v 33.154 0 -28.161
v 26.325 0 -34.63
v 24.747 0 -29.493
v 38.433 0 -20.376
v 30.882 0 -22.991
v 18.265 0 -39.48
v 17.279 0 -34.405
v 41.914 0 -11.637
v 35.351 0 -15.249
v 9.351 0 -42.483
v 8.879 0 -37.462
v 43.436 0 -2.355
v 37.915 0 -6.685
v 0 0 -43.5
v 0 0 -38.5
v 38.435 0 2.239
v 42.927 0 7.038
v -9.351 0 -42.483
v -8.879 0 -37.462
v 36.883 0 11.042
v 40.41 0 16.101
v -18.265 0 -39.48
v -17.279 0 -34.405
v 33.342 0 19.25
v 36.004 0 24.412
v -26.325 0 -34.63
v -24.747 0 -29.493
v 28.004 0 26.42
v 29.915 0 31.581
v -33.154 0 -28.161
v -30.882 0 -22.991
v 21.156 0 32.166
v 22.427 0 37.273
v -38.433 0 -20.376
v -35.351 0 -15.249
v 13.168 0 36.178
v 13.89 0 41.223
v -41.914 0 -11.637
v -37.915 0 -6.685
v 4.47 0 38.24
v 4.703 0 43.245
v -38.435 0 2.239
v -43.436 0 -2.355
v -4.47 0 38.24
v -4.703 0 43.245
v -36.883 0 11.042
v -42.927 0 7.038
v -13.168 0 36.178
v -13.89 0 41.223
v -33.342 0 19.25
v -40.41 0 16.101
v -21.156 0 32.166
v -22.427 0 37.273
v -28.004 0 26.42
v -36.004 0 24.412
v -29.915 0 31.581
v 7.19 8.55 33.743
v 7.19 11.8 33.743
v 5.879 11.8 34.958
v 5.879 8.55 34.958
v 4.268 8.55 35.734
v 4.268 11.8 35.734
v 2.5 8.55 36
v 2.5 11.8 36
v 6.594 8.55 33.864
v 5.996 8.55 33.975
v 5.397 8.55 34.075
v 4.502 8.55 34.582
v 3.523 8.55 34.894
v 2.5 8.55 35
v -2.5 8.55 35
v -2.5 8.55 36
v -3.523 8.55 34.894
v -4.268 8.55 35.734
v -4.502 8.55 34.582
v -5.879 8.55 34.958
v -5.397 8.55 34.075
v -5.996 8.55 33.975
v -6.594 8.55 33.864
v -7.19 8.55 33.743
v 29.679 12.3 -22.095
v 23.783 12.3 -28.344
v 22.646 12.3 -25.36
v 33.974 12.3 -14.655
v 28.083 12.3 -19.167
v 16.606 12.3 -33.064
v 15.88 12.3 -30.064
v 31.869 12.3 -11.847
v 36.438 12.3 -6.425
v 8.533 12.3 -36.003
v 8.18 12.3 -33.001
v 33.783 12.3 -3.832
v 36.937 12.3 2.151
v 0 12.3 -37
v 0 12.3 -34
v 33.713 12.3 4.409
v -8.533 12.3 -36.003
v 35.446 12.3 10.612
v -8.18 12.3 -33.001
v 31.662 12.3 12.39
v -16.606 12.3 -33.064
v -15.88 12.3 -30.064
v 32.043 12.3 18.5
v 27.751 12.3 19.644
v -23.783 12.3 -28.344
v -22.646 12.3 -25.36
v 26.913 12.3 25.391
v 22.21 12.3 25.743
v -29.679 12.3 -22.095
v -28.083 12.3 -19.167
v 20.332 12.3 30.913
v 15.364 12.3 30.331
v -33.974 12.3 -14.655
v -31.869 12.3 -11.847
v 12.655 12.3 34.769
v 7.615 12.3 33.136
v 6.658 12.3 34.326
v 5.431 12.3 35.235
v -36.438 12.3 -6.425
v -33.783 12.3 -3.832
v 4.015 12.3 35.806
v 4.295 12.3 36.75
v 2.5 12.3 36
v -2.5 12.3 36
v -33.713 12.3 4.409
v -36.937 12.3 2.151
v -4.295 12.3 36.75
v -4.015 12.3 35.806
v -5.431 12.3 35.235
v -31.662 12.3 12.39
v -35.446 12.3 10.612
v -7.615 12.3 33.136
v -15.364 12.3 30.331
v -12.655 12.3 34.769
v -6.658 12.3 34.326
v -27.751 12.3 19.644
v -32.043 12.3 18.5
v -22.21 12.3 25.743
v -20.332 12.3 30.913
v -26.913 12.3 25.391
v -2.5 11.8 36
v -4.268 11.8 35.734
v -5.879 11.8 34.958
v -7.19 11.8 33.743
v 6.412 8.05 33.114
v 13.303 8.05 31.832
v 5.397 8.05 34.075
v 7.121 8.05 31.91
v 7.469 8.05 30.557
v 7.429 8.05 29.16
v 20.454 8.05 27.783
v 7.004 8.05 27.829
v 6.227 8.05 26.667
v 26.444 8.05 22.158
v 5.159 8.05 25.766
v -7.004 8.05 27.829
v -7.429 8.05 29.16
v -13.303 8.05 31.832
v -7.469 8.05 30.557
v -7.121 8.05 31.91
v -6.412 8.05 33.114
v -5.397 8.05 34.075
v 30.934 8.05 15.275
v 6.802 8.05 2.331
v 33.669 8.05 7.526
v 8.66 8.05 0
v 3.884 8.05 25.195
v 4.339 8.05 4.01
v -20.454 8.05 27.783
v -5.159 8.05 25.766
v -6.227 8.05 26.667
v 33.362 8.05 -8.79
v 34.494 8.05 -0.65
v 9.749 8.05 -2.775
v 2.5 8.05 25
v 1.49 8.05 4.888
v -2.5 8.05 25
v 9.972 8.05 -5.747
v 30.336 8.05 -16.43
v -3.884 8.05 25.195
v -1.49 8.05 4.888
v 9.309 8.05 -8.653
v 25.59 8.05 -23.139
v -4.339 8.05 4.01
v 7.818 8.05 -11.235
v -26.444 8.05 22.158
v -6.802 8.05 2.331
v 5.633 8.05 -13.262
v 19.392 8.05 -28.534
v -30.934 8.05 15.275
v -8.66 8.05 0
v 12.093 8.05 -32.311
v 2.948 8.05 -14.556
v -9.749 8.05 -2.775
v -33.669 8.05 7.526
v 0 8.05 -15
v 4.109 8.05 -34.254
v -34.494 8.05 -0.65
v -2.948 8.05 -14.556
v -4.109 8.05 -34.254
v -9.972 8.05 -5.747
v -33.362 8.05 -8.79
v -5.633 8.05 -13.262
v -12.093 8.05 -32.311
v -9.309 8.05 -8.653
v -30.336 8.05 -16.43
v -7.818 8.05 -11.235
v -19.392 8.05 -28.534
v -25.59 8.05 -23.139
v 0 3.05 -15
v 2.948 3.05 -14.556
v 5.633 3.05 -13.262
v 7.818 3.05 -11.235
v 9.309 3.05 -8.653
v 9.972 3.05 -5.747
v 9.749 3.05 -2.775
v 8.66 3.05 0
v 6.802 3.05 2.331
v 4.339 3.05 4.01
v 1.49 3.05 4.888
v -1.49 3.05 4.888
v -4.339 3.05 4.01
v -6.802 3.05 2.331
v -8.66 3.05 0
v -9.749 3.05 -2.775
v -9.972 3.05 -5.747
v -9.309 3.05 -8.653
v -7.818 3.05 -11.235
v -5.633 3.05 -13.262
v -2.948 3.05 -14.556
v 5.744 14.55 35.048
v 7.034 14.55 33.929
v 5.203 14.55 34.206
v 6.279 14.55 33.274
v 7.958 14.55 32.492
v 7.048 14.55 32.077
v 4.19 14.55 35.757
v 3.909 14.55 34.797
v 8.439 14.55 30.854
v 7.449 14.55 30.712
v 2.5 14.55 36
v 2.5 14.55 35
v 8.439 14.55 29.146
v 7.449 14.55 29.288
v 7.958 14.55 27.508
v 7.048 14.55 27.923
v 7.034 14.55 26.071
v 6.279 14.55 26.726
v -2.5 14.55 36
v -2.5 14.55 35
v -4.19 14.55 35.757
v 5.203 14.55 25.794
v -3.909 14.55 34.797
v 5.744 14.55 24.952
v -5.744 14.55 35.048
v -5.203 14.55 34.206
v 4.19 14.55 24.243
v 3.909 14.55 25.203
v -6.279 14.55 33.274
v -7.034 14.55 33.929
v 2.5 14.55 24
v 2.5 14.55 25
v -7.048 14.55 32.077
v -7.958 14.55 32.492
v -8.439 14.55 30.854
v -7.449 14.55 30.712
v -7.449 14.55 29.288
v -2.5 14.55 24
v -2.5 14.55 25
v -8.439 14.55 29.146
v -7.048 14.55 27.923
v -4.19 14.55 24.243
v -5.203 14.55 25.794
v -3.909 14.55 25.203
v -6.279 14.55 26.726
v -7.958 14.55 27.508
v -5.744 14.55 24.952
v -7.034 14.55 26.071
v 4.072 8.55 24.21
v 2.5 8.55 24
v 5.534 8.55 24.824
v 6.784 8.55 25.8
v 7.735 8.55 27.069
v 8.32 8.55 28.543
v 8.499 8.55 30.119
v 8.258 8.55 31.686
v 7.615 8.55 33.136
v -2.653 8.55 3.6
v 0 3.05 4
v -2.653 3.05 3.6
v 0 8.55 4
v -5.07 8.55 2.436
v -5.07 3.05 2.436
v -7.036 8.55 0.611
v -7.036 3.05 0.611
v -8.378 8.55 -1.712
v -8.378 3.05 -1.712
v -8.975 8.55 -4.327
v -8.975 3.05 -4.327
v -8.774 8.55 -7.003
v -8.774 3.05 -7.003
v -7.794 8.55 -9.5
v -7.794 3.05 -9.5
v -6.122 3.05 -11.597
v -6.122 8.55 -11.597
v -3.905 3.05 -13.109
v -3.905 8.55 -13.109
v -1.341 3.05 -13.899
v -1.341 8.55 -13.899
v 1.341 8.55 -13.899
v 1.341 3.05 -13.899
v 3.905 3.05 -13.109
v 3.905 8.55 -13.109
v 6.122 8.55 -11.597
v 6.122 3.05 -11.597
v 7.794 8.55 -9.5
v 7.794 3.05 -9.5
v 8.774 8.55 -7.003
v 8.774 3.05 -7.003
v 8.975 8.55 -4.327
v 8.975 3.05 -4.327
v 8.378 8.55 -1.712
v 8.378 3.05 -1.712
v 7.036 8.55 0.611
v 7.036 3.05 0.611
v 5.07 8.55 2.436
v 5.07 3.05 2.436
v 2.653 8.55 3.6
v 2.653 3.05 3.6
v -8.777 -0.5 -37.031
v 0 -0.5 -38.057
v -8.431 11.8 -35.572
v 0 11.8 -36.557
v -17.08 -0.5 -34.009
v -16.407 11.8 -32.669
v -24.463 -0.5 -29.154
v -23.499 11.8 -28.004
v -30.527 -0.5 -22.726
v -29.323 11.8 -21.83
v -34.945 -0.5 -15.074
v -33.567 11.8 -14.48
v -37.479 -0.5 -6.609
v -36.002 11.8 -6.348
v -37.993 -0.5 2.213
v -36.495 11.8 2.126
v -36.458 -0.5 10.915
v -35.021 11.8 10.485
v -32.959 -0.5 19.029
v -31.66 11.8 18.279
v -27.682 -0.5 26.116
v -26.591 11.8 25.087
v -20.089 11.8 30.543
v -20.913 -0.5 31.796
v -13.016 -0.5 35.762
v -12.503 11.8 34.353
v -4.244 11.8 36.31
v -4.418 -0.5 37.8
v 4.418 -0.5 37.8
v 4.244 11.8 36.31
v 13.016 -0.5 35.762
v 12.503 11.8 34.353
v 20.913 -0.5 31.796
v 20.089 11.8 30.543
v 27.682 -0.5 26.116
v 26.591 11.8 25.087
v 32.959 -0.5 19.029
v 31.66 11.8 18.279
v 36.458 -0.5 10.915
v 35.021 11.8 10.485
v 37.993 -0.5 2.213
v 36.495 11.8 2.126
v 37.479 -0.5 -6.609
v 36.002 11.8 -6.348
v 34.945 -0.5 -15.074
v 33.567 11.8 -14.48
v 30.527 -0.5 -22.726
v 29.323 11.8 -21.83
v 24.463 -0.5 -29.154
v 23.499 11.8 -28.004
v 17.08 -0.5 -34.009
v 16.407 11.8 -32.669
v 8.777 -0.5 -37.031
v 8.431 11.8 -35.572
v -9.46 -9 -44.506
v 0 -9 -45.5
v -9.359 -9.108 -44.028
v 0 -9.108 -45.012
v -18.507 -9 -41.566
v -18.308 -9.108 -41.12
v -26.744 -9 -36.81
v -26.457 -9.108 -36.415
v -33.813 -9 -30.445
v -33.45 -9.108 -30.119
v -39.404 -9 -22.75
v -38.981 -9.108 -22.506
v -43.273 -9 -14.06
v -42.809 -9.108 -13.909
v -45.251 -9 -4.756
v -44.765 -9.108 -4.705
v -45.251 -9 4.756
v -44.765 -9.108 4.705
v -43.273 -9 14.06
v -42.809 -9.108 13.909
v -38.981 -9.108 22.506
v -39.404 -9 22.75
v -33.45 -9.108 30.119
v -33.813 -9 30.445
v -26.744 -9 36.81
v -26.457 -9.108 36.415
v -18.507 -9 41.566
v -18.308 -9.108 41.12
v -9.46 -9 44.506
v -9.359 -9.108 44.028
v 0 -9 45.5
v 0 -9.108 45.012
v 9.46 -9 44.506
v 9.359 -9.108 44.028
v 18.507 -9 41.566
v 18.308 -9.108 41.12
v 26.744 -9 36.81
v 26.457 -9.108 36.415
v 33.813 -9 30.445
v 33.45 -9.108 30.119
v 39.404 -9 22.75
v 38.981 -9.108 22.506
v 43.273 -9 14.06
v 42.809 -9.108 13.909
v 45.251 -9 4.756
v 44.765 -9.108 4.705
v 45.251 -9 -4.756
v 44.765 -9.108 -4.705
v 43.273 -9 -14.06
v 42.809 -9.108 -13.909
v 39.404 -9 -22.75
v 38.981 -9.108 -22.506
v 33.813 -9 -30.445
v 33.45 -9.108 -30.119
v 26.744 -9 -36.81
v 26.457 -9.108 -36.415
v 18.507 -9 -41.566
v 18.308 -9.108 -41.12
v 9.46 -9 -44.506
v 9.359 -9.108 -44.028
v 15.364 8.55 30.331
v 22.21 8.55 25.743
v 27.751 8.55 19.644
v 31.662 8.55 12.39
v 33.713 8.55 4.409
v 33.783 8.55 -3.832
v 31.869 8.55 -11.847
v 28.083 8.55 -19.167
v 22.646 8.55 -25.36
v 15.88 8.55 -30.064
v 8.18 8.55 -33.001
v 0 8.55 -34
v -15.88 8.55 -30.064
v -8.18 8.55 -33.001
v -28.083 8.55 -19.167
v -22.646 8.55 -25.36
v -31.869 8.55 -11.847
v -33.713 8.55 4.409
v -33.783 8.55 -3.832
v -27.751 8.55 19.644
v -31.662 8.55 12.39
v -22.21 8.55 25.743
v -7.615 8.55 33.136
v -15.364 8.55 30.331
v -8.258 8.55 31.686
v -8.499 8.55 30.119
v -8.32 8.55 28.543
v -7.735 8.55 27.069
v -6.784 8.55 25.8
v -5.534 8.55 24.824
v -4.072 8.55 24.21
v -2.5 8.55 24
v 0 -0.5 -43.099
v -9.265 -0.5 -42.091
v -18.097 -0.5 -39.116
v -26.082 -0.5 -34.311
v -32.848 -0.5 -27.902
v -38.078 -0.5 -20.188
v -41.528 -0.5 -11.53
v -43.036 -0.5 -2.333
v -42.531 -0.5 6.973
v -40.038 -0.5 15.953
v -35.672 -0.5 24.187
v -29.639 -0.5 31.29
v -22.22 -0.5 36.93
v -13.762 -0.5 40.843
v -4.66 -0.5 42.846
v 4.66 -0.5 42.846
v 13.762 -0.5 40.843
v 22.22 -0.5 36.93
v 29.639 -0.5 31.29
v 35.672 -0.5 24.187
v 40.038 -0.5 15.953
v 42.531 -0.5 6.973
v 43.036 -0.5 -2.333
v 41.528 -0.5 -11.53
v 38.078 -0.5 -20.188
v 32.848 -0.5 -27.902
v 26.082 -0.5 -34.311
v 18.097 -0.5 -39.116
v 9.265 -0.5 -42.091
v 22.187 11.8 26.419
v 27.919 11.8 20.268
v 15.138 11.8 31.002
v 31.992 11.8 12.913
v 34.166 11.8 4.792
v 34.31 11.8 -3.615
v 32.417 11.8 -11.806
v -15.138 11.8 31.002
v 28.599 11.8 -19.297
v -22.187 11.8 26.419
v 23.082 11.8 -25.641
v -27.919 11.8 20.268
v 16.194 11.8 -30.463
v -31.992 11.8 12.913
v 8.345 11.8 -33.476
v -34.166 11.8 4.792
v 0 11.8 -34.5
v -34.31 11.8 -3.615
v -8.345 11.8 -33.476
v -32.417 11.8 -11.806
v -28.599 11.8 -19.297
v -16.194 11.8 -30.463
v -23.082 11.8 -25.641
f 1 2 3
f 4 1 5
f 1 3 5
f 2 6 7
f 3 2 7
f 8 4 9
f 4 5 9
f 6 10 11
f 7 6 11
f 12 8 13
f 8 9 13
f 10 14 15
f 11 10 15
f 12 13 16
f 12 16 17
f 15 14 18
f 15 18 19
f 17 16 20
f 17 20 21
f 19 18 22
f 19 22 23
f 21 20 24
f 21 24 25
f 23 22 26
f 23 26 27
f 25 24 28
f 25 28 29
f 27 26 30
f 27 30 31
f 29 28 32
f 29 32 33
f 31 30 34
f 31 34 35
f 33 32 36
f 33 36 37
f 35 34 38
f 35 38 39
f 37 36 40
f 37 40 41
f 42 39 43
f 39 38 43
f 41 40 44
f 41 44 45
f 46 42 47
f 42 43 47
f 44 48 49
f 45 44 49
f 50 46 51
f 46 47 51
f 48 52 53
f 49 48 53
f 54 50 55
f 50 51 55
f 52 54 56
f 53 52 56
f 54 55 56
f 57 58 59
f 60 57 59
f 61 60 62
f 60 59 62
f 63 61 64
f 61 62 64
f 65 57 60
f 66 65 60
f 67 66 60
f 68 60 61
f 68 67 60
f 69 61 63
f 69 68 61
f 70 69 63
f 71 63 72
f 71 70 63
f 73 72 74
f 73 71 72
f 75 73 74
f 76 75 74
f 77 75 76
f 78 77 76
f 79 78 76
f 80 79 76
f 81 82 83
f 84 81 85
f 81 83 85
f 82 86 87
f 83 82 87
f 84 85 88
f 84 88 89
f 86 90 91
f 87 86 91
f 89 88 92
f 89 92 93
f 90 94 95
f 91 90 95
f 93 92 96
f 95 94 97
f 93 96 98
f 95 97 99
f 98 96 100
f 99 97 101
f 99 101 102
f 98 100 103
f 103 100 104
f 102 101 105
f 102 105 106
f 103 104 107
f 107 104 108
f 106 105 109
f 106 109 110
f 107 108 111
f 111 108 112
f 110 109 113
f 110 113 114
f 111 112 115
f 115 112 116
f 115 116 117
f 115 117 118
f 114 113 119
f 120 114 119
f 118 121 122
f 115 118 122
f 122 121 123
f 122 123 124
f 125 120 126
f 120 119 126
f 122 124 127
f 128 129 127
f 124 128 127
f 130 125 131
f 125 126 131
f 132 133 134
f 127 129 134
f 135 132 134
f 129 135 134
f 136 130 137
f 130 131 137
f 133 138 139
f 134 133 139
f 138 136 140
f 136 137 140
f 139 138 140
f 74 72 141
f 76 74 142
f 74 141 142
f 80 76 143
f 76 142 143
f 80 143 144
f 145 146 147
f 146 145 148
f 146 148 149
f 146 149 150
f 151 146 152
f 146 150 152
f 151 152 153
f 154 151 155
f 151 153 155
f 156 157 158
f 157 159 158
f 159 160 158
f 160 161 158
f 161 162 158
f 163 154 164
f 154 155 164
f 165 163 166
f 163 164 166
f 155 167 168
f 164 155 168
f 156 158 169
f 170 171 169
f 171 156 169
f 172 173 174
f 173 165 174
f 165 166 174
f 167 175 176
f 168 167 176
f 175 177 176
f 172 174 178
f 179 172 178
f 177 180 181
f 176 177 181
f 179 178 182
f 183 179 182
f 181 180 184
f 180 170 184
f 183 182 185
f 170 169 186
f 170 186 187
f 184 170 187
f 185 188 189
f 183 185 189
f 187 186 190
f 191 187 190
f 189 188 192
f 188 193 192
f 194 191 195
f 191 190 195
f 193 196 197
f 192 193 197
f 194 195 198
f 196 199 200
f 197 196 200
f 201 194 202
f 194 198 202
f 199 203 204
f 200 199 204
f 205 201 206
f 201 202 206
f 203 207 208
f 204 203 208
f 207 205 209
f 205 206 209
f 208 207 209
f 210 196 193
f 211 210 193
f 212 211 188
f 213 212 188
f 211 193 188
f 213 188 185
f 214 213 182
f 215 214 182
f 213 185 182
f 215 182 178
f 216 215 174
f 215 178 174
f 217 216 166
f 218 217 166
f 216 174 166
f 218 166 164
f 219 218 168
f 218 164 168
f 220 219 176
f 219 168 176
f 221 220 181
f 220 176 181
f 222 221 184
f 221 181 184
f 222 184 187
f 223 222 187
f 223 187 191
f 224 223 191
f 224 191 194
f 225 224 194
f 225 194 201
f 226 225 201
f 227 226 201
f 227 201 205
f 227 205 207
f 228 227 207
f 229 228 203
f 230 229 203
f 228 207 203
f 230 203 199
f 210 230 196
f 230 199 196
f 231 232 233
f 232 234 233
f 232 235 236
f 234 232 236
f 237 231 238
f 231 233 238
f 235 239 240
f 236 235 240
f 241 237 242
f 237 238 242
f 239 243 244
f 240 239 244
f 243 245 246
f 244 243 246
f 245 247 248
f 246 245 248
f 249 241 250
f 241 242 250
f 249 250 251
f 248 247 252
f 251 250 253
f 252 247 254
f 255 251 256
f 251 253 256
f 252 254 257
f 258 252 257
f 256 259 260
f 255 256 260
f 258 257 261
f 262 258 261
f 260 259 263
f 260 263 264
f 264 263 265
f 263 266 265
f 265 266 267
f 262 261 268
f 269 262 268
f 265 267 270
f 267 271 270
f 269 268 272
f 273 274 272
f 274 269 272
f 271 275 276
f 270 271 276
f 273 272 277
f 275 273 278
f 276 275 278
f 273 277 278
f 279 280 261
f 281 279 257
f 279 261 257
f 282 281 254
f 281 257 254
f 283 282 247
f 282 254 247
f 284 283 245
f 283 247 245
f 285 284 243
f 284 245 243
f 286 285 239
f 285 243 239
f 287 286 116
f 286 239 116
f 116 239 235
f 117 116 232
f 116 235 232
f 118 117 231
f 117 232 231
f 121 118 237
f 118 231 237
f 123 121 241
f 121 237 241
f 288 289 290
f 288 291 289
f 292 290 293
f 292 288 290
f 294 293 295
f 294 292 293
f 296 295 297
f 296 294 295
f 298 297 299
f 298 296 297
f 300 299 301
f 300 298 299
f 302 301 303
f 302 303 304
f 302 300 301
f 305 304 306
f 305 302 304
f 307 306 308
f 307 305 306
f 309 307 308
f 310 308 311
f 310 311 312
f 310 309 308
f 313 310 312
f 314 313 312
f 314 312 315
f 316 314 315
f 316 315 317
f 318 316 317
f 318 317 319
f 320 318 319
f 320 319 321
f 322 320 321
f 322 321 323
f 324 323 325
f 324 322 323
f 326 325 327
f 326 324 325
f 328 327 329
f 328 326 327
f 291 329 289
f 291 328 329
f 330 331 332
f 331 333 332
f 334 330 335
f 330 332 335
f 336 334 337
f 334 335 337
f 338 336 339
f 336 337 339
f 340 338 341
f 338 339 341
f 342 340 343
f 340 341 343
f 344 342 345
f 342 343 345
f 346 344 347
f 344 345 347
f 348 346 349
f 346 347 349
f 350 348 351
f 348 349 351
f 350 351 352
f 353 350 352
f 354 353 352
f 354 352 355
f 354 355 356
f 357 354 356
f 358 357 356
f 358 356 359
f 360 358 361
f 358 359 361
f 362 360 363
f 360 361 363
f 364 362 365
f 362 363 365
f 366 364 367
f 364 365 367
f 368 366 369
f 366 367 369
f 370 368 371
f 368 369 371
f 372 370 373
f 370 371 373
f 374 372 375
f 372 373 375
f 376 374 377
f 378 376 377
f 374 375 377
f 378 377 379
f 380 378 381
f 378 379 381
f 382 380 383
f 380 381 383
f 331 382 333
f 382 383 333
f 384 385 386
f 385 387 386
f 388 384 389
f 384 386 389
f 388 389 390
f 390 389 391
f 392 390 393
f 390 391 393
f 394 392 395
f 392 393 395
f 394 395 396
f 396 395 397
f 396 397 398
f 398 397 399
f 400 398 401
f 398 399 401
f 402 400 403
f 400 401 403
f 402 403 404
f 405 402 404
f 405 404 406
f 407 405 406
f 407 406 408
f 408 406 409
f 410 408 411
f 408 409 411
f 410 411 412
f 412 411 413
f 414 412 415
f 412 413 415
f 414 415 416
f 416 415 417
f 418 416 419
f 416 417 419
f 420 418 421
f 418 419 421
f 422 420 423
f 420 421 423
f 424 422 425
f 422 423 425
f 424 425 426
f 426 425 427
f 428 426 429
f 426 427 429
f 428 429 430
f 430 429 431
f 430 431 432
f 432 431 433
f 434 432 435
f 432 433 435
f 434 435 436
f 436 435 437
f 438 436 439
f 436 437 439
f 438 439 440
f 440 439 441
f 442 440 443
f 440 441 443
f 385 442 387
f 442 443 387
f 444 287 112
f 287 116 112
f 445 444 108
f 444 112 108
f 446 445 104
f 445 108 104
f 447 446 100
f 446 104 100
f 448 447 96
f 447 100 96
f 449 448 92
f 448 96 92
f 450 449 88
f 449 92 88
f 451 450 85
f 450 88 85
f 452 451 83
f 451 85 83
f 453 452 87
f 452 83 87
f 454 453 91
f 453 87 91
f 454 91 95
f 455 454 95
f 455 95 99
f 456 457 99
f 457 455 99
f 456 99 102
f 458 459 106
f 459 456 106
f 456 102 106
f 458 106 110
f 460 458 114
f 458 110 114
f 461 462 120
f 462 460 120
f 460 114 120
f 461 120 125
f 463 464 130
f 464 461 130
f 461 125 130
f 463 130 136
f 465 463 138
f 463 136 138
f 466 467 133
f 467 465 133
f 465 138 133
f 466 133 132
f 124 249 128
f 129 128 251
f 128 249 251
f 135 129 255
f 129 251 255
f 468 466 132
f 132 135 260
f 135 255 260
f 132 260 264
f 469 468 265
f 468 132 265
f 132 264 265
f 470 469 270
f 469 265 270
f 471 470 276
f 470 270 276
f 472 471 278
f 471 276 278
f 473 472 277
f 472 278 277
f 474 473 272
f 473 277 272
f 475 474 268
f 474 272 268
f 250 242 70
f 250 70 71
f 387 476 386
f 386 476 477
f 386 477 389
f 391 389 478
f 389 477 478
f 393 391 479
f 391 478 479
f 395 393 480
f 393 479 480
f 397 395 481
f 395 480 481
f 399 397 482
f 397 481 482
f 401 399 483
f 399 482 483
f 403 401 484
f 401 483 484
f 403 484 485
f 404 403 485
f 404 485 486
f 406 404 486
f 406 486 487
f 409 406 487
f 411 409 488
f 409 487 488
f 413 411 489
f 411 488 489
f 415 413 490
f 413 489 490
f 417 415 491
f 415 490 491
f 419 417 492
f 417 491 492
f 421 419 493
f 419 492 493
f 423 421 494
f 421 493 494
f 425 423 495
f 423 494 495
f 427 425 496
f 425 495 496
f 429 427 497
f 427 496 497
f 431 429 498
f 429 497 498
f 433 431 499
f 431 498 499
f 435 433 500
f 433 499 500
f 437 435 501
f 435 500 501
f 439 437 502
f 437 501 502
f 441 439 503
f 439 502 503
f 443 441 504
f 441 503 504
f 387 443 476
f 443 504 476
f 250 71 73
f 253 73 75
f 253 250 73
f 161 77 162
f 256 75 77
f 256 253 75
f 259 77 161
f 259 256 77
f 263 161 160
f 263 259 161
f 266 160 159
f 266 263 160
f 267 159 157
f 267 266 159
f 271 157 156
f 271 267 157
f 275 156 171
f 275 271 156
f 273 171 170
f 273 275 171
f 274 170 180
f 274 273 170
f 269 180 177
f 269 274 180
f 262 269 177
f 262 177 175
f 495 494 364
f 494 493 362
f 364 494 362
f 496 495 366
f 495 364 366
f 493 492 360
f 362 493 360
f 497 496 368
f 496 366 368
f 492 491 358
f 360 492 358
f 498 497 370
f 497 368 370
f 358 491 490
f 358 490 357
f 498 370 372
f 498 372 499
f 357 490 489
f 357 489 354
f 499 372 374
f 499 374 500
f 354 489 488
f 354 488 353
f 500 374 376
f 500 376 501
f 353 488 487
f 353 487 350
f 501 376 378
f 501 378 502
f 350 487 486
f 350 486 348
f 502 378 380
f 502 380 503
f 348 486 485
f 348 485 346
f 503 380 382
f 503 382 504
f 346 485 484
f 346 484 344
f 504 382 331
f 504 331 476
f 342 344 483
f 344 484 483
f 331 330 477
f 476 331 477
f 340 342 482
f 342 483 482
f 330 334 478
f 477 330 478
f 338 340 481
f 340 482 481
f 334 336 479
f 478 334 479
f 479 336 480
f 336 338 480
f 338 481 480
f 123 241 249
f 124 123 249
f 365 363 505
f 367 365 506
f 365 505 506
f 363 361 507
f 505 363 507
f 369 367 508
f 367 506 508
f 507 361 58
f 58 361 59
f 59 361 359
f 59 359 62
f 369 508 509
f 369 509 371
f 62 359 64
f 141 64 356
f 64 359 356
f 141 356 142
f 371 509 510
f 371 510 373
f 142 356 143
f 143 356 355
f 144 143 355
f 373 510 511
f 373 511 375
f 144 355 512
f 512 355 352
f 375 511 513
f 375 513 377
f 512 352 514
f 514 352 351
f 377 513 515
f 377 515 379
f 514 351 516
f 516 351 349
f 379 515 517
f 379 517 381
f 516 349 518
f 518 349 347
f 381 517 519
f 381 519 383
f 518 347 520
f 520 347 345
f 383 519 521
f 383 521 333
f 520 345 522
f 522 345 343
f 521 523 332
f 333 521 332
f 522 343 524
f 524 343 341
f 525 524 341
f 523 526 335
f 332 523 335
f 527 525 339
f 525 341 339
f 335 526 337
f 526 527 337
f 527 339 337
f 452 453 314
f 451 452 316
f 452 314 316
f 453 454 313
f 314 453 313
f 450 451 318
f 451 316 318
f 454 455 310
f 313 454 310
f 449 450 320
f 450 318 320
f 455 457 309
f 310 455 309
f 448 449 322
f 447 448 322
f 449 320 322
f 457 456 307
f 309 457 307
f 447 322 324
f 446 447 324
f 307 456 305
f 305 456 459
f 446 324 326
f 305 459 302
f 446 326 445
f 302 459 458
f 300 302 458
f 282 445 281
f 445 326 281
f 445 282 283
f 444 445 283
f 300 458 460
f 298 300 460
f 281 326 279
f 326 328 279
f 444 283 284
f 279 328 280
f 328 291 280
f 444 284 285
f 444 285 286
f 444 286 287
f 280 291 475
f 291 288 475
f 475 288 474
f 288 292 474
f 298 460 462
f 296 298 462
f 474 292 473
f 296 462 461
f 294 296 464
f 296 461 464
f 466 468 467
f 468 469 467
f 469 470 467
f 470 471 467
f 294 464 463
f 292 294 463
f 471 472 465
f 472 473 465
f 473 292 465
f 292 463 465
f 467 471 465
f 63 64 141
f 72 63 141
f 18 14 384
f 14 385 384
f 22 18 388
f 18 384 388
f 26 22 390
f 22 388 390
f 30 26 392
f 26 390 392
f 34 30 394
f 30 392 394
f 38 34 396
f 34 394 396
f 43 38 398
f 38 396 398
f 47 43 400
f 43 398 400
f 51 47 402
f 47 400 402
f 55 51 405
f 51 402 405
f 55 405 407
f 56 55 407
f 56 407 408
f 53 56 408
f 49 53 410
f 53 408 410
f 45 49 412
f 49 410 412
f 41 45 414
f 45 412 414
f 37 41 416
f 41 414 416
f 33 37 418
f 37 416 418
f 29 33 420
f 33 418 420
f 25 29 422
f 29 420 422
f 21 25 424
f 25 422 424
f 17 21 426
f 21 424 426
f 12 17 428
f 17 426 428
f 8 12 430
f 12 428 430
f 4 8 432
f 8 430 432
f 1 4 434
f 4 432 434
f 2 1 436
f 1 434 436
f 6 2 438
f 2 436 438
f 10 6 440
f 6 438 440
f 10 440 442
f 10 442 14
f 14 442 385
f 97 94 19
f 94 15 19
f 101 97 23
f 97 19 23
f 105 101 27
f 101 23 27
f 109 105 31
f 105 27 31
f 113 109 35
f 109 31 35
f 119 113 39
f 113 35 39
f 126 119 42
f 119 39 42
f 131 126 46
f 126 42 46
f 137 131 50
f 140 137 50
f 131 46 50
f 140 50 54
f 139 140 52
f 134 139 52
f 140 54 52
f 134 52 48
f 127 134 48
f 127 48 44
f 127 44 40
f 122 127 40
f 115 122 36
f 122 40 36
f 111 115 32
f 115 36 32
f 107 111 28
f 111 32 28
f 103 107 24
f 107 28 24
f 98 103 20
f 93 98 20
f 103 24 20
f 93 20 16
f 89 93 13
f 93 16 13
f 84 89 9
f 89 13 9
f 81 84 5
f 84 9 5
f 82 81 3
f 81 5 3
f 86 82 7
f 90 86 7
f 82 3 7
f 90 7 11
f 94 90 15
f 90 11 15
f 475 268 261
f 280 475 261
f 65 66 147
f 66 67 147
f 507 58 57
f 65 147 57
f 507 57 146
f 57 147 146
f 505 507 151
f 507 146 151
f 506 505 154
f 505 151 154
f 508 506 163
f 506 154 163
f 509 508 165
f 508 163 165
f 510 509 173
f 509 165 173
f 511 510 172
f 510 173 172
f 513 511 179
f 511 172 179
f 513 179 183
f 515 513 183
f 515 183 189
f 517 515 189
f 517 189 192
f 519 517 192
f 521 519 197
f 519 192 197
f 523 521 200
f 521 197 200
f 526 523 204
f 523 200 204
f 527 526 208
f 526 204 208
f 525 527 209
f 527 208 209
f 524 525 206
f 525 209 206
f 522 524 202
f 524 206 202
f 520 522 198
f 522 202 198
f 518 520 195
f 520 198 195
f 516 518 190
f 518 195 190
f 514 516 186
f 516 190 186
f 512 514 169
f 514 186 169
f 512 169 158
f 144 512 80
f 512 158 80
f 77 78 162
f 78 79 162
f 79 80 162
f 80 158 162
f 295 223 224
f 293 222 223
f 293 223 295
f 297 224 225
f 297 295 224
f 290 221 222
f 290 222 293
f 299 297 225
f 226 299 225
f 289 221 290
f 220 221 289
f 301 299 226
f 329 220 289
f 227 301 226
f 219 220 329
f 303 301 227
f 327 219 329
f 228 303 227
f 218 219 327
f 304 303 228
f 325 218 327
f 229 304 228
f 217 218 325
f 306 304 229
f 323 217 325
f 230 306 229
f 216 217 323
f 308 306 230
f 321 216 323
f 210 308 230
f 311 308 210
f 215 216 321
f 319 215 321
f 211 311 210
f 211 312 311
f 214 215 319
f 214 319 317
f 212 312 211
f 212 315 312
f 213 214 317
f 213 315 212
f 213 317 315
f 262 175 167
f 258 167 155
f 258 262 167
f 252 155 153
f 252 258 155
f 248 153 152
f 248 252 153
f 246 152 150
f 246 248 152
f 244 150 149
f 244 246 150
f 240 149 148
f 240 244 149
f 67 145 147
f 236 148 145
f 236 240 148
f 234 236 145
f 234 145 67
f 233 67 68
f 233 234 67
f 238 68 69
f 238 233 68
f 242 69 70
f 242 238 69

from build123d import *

# Parameters (mm, degrees)
CUT_EXTRUDE_1_DEPTH = 5
EXTRUDE_START       = 6
EXTRUDE_1_DEPTH     = 6
SKETCH_8_R          = 9
CUT_EXTRUDE_2_DEPTH = 6
SKETCH_9_R          = 10
SKETCH_9_R_2        = 9
EXTRUDE_2_DEPTH     = 5


with BuildPart() as part:
    # 草图2 → 旋转1 (revolve)
    with BuildSketch(Plane.XY, mode=Mode.PRIVATE) as revolve_1_sk:
        Polygon((43.5, 0), (45.5, -9), (45.01190647, -9.108465229), (43.098914197, -0.5), (38.057271307, -0.5), (36.557271307, 11.8), (34.5, 11.8), (34.5, 8.05), (0, 8.05), (0, 8.55), (34, 8.55), (34, 12.3), (37, 12.3), (38.5, 0), align=None)
    revolve(revolve_1_sk.sketch.rotate(Axis((0, 0, 0), (0, 1, 0)), 90), axis=Axis((0, 0, 0), (0, 1, 0)))

    # 草图4 → 切除-拉伸1 (cut, symmetric)
    with BuildSketch(Plane(origin=(0, 8.55, 0), x_dir=(1, 0, 0), z_dir=(0, 1, 0))):
        with BuildLine():
            Line((-2.5, -35), (2.5, -35))
            ThreePointArc((2.5, -35), (7.5, -30), (2.5, -25))
            Line((2.5, -25), (-2.5, -25))
            ThreePointArc((-2.5, -25), (-7.5, -30), (-2.5, -35))
        make_face()
    extrude(amount=CUT_EXTRUDE_1_DEPTH, both=True, mode=Mode.SUBTRACT)

    # 草图6 → 凸台-拉伸1 (add)
    with BuildSketch(Plane(origin=(0, 8.55, 0), x_dir=(1, 0, 0), z_dir=(0, 1, 0)).offset(EXTRUDE_START)):
        with BuildLine():
            Line((-2.5, -24), (2.5, -24))
            ThreePointArc((2.5, -24), (8.5, -30), (2.5, -36))
            Line((2.5, -36), (-2.5, -36))
            ThreePointArc((-2.5, -36), (-8.5, -30), (-2.5, -24))
        make_face()
        with BuildLine():
            Line((-2.5, -25), (2.5, -25))
            ThreePointArc((2.5, -25), (7.5, -30), (2.5, -35))
            Line((2.5, -35), (-2.5, -35))
            ThreePointArc((-2.5, -35), (-7.5, -30), (-2.5, -25))
        make_face(mode=Mode.SUBTRACT)
    extrude(amount=-EXTRUDE_1_DEPTH)

    # 草图8 → 切除-拉伸2 (cut)
    with BuildSketch(Plane(origin=(0, 8.55, 0), x_dir=(1, 0, 0), z_dir=(0, 1, 0))):
        with Locations(Location((0, 5, 0), (0, 0, 270))):
            Circle(SKETCH_8_R)
    extrude(amount=-CUT_EXTRUDE_2_DEPTH, mode=Mode.SUBTRACT)

    # 草图9 → 凸台-拉伸2 (add)
    with BuildSketch(Plane.XZ.offset(-8.05)):
        with Locations(Location((0, -5, 0), (0, 0, 270))):
            Circle(SKETCH_9_R)
        with Locations(Location((0, -5, 0), (0, 0, 90))):
            Circle(SKETCH_9_R_2, mode=Mode.SUBTRACT)
    extrude(amount=EXTRUDE_2_DEPTH)


solid = part.part
